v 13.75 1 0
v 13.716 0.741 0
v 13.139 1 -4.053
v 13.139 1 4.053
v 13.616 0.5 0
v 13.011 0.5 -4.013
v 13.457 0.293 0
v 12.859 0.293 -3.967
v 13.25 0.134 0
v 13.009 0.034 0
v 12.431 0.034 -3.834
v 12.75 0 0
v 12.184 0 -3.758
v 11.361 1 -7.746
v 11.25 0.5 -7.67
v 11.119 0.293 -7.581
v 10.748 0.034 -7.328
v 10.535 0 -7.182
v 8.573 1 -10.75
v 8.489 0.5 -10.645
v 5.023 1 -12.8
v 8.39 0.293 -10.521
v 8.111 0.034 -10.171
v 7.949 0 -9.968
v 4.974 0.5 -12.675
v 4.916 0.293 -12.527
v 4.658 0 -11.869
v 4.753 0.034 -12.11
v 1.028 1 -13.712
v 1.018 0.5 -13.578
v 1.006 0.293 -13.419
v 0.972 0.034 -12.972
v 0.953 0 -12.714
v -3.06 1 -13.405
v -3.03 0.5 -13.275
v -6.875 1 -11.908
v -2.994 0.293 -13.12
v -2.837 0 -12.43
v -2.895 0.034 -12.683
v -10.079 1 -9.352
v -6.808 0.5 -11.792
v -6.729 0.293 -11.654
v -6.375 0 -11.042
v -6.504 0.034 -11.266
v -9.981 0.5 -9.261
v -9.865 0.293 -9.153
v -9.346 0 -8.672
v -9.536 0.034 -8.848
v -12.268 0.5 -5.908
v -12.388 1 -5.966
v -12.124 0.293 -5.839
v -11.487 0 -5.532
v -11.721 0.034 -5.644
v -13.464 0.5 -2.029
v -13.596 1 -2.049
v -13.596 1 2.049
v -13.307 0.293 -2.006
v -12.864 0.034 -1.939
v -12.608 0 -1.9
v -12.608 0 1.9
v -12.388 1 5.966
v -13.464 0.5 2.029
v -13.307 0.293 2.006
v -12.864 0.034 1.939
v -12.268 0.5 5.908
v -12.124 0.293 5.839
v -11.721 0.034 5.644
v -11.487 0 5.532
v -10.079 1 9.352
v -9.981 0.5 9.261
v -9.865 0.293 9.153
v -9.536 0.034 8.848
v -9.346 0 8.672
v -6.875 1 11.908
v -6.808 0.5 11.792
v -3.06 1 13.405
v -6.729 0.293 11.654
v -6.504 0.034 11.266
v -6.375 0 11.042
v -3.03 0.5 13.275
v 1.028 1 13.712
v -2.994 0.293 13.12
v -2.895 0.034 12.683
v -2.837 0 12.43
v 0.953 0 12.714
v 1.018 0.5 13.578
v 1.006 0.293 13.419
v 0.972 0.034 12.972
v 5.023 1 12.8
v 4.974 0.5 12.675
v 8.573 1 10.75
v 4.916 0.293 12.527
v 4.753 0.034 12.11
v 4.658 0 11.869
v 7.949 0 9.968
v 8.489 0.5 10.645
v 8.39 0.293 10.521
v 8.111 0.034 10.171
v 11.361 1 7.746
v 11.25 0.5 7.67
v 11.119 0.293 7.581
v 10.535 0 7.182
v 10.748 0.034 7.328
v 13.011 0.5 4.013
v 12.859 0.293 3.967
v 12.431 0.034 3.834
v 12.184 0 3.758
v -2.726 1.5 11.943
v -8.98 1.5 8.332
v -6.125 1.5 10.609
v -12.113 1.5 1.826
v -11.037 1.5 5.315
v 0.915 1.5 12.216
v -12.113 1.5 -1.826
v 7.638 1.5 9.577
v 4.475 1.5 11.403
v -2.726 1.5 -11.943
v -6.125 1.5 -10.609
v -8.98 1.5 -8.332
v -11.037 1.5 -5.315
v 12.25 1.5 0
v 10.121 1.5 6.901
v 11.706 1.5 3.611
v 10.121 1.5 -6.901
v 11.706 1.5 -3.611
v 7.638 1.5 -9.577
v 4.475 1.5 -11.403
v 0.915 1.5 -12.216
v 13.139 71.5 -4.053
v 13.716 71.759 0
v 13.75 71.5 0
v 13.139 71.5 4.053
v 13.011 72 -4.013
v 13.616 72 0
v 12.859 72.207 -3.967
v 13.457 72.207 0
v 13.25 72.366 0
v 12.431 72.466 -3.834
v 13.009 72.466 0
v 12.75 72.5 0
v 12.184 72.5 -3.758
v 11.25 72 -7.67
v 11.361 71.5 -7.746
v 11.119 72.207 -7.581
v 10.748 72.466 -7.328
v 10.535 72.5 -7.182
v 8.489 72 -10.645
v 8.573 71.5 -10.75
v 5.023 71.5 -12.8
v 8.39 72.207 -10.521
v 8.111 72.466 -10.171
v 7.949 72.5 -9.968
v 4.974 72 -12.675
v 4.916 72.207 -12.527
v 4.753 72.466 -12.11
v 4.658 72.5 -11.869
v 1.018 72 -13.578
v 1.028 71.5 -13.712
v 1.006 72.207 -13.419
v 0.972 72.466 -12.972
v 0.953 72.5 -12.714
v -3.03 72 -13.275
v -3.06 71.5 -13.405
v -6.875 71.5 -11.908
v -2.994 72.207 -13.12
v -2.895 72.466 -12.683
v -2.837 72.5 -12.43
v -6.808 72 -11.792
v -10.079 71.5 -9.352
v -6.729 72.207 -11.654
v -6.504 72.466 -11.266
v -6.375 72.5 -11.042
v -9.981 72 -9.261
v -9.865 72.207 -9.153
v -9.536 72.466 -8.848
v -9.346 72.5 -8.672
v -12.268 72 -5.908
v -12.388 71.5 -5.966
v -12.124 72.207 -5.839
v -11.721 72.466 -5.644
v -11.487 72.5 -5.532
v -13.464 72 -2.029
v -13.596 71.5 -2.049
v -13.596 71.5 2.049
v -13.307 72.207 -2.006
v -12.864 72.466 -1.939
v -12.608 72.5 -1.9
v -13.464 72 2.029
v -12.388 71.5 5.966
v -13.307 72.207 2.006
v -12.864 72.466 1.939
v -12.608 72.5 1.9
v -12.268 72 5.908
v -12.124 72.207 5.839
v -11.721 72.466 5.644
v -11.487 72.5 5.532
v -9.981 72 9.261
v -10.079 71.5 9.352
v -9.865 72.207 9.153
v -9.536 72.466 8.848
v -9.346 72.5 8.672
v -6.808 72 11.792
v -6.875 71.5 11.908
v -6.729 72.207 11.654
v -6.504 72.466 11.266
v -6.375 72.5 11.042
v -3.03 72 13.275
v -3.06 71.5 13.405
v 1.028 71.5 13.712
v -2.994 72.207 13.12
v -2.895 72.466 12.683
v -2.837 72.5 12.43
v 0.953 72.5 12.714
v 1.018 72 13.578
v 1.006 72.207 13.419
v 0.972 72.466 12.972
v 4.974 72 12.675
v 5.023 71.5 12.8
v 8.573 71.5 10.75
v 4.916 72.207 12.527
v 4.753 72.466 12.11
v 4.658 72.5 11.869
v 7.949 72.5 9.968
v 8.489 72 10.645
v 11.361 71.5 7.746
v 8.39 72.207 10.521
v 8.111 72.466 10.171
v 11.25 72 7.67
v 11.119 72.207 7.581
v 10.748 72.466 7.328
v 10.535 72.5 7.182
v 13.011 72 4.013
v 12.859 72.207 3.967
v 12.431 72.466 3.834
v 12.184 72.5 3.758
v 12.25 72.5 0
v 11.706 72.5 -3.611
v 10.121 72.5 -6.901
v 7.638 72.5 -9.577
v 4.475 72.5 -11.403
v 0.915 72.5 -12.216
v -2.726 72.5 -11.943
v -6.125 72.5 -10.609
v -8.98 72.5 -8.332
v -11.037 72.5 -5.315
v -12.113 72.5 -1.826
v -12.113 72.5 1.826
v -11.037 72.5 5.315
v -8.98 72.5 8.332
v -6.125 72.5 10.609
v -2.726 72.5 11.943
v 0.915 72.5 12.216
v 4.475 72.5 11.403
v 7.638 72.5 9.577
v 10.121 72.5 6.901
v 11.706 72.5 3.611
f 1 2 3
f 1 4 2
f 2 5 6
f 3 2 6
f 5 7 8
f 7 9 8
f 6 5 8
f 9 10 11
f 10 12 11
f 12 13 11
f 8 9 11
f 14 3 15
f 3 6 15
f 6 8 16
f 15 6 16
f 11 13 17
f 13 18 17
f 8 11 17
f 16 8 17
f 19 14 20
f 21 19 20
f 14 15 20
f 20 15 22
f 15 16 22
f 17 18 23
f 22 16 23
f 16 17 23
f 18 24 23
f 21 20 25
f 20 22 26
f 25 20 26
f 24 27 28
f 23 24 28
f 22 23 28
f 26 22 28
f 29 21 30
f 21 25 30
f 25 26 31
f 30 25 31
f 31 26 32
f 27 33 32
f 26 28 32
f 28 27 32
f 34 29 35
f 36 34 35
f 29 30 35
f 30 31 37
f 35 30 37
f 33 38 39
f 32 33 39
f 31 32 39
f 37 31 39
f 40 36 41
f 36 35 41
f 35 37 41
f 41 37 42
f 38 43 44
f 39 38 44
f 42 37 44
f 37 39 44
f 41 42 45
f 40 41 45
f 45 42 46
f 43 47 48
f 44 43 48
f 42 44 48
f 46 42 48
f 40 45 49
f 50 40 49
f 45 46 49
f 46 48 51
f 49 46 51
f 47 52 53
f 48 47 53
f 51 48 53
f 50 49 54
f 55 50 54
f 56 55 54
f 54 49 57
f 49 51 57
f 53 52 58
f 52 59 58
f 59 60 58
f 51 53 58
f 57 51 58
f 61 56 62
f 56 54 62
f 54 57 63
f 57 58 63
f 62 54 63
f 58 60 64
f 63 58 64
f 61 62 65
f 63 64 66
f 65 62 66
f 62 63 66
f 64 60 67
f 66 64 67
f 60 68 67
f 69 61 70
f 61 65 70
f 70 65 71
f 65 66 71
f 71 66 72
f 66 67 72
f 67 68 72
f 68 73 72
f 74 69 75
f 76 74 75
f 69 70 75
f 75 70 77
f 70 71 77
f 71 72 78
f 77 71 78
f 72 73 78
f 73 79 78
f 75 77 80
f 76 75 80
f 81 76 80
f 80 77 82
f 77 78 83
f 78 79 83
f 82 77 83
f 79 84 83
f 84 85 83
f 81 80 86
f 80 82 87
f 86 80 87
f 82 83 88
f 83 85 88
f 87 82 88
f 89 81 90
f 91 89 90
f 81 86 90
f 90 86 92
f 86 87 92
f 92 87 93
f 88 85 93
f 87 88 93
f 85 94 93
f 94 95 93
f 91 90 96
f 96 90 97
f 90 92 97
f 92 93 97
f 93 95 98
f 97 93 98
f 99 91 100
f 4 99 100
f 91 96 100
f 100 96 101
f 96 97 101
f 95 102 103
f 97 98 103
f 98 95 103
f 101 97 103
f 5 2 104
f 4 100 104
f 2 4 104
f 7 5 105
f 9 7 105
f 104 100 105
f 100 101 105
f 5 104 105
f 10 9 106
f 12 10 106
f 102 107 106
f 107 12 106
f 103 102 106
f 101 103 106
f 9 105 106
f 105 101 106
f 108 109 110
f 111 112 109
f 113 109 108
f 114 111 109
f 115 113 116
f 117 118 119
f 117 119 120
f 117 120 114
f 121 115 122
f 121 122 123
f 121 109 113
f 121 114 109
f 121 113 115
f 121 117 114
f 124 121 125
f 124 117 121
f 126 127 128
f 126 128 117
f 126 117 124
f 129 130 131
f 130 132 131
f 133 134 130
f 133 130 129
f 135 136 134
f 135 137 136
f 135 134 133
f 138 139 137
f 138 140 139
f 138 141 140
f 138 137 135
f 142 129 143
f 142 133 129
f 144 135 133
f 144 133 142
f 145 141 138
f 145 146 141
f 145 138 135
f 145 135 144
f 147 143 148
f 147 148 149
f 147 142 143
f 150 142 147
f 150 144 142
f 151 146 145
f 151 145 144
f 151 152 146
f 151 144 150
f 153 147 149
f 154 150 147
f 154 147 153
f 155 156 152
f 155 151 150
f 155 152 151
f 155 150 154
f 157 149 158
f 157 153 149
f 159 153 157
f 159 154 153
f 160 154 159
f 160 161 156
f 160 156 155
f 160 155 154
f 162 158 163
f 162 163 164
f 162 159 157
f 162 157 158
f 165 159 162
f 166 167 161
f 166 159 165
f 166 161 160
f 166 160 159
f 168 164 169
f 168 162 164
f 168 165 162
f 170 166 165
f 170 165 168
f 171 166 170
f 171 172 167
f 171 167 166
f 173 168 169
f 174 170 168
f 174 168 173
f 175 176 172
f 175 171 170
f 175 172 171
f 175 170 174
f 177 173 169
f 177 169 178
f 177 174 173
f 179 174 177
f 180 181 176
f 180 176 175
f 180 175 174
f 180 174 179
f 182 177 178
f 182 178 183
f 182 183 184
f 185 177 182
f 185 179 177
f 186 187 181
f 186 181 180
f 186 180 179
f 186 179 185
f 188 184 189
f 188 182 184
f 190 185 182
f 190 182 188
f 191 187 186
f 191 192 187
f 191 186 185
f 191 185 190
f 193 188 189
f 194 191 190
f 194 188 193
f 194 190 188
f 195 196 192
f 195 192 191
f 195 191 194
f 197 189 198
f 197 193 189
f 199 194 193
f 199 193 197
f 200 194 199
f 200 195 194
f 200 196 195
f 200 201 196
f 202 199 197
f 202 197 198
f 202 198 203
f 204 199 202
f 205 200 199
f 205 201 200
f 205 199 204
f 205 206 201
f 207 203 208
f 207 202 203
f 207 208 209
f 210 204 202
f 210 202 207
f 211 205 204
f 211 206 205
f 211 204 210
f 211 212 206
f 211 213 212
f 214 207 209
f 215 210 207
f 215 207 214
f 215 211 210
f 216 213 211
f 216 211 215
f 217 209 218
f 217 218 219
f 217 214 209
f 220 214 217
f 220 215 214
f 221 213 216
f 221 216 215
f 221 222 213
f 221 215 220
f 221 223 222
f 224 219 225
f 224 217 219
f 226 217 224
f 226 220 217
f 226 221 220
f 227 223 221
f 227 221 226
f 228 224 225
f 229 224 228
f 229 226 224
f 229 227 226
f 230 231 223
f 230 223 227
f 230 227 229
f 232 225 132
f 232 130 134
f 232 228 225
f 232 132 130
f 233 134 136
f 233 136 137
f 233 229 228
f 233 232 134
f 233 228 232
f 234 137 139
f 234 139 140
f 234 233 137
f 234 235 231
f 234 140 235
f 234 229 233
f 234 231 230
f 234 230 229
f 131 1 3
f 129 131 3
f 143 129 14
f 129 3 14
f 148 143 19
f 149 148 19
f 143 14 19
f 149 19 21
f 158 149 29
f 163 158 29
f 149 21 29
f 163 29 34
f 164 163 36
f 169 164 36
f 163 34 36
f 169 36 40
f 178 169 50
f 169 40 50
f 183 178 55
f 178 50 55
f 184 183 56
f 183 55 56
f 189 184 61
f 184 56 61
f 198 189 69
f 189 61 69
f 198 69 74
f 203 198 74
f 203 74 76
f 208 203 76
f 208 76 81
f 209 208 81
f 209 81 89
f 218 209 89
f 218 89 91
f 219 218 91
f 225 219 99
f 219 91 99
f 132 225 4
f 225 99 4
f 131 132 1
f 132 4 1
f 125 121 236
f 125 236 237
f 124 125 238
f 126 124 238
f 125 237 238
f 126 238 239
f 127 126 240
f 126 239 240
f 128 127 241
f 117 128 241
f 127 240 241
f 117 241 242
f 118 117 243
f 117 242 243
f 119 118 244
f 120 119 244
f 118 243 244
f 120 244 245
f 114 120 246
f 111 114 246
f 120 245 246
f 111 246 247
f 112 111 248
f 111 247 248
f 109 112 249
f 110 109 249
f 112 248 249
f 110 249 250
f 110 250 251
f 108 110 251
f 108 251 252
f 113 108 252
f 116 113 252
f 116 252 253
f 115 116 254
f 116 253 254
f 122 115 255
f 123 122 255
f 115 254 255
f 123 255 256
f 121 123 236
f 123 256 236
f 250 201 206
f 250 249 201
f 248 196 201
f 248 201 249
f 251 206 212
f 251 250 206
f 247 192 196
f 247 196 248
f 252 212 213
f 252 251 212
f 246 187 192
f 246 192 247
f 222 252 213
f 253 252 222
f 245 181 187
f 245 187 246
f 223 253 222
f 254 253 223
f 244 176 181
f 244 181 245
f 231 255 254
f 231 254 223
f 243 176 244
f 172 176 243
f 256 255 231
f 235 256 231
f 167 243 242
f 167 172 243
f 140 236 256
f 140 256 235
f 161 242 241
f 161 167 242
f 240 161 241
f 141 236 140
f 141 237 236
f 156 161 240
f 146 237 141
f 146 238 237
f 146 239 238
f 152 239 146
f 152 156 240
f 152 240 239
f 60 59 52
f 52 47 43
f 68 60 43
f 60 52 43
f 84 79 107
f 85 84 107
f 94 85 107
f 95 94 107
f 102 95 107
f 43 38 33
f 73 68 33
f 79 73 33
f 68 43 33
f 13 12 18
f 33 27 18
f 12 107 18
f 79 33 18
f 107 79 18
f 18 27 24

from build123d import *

# Parameters (mm, degrees)
SKETCH1_R           = 13.75
BOSS_EXTRUDE1_DEPTH = 72.5
SKETCH2_R           = 12.25
CUT_EXTRUDE1_DEPTH  = 71
FILLET1_R           = 1


with BuildPart() as part:
    # Sketch1 → Boss-Extrude1 (new body)
    with BuildSketch(Plane(origin=(0, 0, 0), x_dir=(1, 0, 0), z_dir=(0, 1, 0))):
        Circle(SKETCH1_R)
    extrude(amount=BOSS_EXTRUDE1_DEPTH)

    # Sketch2 → Cut-Extrude1 (cut)
    with BuildSketch(Plane(origin=(0, 72.5, 0), x_dir=(1, 0, 0), z_dir=(0, 1, 0))):
        Circle(SKETCH2_R)
    extrude(amount=-CUT_EXTRUDE1_DEPTH, mode=Mode.SUBTRACT)

    # Fillet1
    fillet1_edges = [part.edges().sort_by_distance(p)[0] for p in [
        (-13.75, 0, 0),
        (-13.75, 72.5, 0),
    ]]
    fillet(fillet1_edges, radius=FILLET1_R)


solid = part.part
